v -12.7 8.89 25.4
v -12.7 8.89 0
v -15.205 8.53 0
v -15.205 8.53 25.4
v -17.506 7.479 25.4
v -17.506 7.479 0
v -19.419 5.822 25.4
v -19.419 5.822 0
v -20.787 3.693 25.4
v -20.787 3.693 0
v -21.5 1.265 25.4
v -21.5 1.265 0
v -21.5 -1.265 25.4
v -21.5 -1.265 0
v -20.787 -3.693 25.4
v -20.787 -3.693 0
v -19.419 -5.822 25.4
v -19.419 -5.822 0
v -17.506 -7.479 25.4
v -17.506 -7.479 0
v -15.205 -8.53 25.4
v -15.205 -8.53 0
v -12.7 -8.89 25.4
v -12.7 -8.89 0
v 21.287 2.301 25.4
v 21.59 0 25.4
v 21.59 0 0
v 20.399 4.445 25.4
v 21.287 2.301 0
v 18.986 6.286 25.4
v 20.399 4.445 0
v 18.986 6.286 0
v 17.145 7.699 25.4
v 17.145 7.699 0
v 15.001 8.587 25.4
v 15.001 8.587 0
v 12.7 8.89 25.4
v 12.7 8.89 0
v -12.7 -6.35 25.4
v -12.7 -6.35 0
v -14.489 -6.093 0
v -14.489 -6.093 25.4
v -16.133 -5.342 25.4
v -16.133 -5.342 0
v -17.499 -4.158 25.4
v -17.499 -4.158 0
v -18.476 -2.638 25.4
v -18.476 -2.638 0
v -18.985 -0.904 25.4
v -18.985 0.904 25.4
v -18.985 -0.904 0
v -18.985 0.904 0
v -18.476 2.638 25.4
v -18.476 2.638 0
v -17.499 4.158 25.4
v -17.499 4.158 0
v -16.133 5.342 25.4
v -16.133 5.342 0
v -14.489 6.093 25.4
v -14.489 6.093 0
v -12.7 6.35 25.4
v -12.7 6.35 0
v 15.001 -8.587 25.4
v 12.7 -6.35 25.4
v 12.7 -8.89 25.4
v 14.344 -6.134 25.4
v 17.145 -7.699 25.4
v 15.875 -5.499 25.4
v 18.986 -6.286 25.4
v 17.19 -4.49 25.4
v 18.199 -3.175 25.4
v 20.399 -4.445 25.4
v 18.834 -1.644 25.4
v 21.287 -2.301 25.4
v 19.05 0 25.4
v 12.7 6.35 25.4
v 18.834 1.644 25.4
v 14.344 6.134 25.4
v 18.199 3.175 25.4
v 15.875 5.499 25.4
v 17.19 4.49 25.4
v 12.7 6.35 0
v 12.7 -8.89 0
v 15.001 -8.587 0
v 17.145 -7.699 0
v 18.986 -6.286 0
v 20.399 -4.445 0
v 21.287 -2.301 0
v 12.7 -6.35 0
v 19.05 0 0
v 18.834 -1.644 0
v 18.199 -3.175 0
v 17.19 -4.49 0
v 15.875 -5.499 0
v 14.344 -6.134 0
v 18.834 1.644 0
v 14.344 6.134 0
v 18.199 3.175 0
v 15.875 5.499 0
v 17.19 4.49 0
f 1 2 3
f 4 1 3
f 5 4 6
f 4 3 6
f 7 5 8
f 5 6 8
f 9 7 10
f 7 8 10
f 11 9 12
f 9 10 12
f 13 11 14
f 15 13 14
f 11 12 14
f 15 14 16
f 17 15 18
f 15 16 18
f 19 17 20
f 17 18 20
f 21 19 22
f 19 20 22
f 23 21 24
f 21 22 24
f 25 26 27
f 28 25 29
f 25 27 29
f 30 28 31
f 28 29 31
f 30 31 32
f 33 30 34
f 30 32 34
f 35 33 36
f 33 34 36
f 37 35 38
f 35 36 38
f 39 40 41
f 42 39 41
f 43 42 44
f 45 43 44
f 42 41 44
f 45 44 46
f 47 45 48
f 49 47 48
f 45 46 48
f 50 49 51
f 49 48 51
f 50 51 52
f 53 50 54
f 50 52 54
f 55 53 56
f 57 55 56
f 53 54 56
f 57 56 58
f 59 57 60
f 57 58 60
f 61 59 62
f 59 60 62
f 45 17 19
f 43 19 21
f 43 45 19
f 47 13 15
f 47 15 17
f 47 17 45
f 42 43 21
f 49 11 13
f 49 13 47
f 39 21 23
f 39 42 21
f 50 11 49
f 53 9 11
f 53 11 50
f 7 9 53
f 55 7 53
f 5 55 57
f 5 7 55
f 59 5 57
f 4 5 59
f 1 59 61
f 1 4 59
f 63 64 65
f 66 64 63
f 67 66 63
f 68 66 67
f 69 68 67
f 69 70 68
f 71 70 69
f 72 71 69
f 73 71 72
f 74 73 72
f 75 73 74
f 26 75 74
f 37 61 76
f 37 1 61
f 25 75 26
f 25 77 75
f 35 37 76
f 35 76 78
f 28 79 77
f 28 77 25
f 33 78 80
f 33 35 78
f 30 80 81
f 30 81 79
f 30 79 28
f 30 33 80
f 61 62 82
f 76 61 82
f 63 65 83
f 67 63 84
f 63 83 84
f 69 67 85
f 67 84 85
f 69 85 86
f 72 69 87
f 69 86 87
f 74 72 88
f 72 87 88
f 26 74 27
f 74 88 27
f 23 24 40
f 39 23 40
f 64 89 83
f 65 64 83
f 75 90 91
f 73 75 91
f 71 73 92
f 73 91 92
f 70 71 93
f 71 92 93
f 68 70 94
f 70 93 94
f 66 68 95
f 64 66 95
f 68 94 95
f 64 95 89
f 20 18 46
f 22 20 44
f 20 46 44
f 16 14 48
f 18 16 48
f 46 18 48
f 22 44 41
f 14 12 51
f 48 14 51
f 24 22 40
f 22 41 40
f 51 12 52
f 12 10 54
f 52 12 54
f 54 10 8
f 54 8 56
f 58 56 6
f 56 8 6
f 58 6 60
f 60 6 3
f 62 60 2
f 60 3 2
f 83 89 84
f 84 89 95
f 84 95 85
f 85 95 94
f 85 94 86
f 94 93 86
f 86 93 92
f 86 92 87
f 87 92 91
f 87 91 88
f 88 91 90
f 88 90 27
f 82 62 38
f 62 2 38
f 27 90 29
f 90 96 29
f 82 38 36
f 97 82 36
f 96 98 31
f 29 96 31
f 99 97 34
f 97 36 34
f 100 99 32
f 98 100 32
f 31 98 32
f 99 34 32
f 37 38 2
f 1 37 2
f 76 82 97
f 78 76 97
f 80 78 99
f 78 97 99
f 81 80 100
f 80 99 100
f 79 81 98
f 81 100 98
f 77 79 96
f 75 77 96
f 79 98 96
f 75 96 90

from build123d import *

# Parameters (mm, degrees)
F1_DEPTH = 25.4


with BuildPart() as f1:
    # F0 (on Top) → F1 (new body)
    with BuildSketch(Plane.XY):
        with BuildLine():
            ThreePointArc((-12.7, 8.89), (-21.59, 0), (-12.7, -8.89))
            Line((-12.7, -8.89), (-12.7, -6.35))
            ThreePointArc((-12.7, -6.35), (-19.05, 0), (-12.7, 6.35))
            Line((-12.7, 6.35), (-12.7, 8.89))
        make_face()
        with BuildLine():
            Line((-6.478296, 6.35), (6.478296, 6.35))
            ThreePointArc((6.478296, 6.35), (9.339896, 8.230541), (12.7, 8.89))
            Line((12.7, 8.89), (-12.7, 8.89))
            ThreePointArc((-12.7, 8.89), (-9.339896, 8.230541), (-6.478296, 6.35))
        make_face()
        with BuildLine():
            Line((6.478296, 6.35), (12.7, 6.35))
            Line((12.7, 6.35), (12.7, 8.89))
            ThreePointArc((12.7, 8.89), (9.339896, 8.230541), (6.478296, 6.35))
        make_face()
        with BuildLine():
            Line((-12.7, 6.35), (-6.478296, 6.35))
            ThreePointArc((-6.478296, 6.35), (-9.339896, 8.230541), (-12.7, 8.89))
            Line((-12.7, 8.89), (-12.7, 6.35))
        make_face()
        with BuildLine():
            ThreePointArc((19.05, 0), (17.190128, -4.490128), (12.7, -6.35))
            Line((12.7, -6.35), (12.7, -8.89))
            ThreePointArc((12.7, -8.89), (18.986179, -6.286179), (21.59, 0))
            ThreePointArc((21.59, 0), (18.986179, 6.286179), (12.7, 8.89))
            Line((12.7, 8.89), (12.7, 6.35))
            ThreePointArc((12.7, 6.35), (17.190128, 4.490128), (19.05, 0))
        make_face()
    extrude(amount=F1_DEPTH)


solid = f1.part
